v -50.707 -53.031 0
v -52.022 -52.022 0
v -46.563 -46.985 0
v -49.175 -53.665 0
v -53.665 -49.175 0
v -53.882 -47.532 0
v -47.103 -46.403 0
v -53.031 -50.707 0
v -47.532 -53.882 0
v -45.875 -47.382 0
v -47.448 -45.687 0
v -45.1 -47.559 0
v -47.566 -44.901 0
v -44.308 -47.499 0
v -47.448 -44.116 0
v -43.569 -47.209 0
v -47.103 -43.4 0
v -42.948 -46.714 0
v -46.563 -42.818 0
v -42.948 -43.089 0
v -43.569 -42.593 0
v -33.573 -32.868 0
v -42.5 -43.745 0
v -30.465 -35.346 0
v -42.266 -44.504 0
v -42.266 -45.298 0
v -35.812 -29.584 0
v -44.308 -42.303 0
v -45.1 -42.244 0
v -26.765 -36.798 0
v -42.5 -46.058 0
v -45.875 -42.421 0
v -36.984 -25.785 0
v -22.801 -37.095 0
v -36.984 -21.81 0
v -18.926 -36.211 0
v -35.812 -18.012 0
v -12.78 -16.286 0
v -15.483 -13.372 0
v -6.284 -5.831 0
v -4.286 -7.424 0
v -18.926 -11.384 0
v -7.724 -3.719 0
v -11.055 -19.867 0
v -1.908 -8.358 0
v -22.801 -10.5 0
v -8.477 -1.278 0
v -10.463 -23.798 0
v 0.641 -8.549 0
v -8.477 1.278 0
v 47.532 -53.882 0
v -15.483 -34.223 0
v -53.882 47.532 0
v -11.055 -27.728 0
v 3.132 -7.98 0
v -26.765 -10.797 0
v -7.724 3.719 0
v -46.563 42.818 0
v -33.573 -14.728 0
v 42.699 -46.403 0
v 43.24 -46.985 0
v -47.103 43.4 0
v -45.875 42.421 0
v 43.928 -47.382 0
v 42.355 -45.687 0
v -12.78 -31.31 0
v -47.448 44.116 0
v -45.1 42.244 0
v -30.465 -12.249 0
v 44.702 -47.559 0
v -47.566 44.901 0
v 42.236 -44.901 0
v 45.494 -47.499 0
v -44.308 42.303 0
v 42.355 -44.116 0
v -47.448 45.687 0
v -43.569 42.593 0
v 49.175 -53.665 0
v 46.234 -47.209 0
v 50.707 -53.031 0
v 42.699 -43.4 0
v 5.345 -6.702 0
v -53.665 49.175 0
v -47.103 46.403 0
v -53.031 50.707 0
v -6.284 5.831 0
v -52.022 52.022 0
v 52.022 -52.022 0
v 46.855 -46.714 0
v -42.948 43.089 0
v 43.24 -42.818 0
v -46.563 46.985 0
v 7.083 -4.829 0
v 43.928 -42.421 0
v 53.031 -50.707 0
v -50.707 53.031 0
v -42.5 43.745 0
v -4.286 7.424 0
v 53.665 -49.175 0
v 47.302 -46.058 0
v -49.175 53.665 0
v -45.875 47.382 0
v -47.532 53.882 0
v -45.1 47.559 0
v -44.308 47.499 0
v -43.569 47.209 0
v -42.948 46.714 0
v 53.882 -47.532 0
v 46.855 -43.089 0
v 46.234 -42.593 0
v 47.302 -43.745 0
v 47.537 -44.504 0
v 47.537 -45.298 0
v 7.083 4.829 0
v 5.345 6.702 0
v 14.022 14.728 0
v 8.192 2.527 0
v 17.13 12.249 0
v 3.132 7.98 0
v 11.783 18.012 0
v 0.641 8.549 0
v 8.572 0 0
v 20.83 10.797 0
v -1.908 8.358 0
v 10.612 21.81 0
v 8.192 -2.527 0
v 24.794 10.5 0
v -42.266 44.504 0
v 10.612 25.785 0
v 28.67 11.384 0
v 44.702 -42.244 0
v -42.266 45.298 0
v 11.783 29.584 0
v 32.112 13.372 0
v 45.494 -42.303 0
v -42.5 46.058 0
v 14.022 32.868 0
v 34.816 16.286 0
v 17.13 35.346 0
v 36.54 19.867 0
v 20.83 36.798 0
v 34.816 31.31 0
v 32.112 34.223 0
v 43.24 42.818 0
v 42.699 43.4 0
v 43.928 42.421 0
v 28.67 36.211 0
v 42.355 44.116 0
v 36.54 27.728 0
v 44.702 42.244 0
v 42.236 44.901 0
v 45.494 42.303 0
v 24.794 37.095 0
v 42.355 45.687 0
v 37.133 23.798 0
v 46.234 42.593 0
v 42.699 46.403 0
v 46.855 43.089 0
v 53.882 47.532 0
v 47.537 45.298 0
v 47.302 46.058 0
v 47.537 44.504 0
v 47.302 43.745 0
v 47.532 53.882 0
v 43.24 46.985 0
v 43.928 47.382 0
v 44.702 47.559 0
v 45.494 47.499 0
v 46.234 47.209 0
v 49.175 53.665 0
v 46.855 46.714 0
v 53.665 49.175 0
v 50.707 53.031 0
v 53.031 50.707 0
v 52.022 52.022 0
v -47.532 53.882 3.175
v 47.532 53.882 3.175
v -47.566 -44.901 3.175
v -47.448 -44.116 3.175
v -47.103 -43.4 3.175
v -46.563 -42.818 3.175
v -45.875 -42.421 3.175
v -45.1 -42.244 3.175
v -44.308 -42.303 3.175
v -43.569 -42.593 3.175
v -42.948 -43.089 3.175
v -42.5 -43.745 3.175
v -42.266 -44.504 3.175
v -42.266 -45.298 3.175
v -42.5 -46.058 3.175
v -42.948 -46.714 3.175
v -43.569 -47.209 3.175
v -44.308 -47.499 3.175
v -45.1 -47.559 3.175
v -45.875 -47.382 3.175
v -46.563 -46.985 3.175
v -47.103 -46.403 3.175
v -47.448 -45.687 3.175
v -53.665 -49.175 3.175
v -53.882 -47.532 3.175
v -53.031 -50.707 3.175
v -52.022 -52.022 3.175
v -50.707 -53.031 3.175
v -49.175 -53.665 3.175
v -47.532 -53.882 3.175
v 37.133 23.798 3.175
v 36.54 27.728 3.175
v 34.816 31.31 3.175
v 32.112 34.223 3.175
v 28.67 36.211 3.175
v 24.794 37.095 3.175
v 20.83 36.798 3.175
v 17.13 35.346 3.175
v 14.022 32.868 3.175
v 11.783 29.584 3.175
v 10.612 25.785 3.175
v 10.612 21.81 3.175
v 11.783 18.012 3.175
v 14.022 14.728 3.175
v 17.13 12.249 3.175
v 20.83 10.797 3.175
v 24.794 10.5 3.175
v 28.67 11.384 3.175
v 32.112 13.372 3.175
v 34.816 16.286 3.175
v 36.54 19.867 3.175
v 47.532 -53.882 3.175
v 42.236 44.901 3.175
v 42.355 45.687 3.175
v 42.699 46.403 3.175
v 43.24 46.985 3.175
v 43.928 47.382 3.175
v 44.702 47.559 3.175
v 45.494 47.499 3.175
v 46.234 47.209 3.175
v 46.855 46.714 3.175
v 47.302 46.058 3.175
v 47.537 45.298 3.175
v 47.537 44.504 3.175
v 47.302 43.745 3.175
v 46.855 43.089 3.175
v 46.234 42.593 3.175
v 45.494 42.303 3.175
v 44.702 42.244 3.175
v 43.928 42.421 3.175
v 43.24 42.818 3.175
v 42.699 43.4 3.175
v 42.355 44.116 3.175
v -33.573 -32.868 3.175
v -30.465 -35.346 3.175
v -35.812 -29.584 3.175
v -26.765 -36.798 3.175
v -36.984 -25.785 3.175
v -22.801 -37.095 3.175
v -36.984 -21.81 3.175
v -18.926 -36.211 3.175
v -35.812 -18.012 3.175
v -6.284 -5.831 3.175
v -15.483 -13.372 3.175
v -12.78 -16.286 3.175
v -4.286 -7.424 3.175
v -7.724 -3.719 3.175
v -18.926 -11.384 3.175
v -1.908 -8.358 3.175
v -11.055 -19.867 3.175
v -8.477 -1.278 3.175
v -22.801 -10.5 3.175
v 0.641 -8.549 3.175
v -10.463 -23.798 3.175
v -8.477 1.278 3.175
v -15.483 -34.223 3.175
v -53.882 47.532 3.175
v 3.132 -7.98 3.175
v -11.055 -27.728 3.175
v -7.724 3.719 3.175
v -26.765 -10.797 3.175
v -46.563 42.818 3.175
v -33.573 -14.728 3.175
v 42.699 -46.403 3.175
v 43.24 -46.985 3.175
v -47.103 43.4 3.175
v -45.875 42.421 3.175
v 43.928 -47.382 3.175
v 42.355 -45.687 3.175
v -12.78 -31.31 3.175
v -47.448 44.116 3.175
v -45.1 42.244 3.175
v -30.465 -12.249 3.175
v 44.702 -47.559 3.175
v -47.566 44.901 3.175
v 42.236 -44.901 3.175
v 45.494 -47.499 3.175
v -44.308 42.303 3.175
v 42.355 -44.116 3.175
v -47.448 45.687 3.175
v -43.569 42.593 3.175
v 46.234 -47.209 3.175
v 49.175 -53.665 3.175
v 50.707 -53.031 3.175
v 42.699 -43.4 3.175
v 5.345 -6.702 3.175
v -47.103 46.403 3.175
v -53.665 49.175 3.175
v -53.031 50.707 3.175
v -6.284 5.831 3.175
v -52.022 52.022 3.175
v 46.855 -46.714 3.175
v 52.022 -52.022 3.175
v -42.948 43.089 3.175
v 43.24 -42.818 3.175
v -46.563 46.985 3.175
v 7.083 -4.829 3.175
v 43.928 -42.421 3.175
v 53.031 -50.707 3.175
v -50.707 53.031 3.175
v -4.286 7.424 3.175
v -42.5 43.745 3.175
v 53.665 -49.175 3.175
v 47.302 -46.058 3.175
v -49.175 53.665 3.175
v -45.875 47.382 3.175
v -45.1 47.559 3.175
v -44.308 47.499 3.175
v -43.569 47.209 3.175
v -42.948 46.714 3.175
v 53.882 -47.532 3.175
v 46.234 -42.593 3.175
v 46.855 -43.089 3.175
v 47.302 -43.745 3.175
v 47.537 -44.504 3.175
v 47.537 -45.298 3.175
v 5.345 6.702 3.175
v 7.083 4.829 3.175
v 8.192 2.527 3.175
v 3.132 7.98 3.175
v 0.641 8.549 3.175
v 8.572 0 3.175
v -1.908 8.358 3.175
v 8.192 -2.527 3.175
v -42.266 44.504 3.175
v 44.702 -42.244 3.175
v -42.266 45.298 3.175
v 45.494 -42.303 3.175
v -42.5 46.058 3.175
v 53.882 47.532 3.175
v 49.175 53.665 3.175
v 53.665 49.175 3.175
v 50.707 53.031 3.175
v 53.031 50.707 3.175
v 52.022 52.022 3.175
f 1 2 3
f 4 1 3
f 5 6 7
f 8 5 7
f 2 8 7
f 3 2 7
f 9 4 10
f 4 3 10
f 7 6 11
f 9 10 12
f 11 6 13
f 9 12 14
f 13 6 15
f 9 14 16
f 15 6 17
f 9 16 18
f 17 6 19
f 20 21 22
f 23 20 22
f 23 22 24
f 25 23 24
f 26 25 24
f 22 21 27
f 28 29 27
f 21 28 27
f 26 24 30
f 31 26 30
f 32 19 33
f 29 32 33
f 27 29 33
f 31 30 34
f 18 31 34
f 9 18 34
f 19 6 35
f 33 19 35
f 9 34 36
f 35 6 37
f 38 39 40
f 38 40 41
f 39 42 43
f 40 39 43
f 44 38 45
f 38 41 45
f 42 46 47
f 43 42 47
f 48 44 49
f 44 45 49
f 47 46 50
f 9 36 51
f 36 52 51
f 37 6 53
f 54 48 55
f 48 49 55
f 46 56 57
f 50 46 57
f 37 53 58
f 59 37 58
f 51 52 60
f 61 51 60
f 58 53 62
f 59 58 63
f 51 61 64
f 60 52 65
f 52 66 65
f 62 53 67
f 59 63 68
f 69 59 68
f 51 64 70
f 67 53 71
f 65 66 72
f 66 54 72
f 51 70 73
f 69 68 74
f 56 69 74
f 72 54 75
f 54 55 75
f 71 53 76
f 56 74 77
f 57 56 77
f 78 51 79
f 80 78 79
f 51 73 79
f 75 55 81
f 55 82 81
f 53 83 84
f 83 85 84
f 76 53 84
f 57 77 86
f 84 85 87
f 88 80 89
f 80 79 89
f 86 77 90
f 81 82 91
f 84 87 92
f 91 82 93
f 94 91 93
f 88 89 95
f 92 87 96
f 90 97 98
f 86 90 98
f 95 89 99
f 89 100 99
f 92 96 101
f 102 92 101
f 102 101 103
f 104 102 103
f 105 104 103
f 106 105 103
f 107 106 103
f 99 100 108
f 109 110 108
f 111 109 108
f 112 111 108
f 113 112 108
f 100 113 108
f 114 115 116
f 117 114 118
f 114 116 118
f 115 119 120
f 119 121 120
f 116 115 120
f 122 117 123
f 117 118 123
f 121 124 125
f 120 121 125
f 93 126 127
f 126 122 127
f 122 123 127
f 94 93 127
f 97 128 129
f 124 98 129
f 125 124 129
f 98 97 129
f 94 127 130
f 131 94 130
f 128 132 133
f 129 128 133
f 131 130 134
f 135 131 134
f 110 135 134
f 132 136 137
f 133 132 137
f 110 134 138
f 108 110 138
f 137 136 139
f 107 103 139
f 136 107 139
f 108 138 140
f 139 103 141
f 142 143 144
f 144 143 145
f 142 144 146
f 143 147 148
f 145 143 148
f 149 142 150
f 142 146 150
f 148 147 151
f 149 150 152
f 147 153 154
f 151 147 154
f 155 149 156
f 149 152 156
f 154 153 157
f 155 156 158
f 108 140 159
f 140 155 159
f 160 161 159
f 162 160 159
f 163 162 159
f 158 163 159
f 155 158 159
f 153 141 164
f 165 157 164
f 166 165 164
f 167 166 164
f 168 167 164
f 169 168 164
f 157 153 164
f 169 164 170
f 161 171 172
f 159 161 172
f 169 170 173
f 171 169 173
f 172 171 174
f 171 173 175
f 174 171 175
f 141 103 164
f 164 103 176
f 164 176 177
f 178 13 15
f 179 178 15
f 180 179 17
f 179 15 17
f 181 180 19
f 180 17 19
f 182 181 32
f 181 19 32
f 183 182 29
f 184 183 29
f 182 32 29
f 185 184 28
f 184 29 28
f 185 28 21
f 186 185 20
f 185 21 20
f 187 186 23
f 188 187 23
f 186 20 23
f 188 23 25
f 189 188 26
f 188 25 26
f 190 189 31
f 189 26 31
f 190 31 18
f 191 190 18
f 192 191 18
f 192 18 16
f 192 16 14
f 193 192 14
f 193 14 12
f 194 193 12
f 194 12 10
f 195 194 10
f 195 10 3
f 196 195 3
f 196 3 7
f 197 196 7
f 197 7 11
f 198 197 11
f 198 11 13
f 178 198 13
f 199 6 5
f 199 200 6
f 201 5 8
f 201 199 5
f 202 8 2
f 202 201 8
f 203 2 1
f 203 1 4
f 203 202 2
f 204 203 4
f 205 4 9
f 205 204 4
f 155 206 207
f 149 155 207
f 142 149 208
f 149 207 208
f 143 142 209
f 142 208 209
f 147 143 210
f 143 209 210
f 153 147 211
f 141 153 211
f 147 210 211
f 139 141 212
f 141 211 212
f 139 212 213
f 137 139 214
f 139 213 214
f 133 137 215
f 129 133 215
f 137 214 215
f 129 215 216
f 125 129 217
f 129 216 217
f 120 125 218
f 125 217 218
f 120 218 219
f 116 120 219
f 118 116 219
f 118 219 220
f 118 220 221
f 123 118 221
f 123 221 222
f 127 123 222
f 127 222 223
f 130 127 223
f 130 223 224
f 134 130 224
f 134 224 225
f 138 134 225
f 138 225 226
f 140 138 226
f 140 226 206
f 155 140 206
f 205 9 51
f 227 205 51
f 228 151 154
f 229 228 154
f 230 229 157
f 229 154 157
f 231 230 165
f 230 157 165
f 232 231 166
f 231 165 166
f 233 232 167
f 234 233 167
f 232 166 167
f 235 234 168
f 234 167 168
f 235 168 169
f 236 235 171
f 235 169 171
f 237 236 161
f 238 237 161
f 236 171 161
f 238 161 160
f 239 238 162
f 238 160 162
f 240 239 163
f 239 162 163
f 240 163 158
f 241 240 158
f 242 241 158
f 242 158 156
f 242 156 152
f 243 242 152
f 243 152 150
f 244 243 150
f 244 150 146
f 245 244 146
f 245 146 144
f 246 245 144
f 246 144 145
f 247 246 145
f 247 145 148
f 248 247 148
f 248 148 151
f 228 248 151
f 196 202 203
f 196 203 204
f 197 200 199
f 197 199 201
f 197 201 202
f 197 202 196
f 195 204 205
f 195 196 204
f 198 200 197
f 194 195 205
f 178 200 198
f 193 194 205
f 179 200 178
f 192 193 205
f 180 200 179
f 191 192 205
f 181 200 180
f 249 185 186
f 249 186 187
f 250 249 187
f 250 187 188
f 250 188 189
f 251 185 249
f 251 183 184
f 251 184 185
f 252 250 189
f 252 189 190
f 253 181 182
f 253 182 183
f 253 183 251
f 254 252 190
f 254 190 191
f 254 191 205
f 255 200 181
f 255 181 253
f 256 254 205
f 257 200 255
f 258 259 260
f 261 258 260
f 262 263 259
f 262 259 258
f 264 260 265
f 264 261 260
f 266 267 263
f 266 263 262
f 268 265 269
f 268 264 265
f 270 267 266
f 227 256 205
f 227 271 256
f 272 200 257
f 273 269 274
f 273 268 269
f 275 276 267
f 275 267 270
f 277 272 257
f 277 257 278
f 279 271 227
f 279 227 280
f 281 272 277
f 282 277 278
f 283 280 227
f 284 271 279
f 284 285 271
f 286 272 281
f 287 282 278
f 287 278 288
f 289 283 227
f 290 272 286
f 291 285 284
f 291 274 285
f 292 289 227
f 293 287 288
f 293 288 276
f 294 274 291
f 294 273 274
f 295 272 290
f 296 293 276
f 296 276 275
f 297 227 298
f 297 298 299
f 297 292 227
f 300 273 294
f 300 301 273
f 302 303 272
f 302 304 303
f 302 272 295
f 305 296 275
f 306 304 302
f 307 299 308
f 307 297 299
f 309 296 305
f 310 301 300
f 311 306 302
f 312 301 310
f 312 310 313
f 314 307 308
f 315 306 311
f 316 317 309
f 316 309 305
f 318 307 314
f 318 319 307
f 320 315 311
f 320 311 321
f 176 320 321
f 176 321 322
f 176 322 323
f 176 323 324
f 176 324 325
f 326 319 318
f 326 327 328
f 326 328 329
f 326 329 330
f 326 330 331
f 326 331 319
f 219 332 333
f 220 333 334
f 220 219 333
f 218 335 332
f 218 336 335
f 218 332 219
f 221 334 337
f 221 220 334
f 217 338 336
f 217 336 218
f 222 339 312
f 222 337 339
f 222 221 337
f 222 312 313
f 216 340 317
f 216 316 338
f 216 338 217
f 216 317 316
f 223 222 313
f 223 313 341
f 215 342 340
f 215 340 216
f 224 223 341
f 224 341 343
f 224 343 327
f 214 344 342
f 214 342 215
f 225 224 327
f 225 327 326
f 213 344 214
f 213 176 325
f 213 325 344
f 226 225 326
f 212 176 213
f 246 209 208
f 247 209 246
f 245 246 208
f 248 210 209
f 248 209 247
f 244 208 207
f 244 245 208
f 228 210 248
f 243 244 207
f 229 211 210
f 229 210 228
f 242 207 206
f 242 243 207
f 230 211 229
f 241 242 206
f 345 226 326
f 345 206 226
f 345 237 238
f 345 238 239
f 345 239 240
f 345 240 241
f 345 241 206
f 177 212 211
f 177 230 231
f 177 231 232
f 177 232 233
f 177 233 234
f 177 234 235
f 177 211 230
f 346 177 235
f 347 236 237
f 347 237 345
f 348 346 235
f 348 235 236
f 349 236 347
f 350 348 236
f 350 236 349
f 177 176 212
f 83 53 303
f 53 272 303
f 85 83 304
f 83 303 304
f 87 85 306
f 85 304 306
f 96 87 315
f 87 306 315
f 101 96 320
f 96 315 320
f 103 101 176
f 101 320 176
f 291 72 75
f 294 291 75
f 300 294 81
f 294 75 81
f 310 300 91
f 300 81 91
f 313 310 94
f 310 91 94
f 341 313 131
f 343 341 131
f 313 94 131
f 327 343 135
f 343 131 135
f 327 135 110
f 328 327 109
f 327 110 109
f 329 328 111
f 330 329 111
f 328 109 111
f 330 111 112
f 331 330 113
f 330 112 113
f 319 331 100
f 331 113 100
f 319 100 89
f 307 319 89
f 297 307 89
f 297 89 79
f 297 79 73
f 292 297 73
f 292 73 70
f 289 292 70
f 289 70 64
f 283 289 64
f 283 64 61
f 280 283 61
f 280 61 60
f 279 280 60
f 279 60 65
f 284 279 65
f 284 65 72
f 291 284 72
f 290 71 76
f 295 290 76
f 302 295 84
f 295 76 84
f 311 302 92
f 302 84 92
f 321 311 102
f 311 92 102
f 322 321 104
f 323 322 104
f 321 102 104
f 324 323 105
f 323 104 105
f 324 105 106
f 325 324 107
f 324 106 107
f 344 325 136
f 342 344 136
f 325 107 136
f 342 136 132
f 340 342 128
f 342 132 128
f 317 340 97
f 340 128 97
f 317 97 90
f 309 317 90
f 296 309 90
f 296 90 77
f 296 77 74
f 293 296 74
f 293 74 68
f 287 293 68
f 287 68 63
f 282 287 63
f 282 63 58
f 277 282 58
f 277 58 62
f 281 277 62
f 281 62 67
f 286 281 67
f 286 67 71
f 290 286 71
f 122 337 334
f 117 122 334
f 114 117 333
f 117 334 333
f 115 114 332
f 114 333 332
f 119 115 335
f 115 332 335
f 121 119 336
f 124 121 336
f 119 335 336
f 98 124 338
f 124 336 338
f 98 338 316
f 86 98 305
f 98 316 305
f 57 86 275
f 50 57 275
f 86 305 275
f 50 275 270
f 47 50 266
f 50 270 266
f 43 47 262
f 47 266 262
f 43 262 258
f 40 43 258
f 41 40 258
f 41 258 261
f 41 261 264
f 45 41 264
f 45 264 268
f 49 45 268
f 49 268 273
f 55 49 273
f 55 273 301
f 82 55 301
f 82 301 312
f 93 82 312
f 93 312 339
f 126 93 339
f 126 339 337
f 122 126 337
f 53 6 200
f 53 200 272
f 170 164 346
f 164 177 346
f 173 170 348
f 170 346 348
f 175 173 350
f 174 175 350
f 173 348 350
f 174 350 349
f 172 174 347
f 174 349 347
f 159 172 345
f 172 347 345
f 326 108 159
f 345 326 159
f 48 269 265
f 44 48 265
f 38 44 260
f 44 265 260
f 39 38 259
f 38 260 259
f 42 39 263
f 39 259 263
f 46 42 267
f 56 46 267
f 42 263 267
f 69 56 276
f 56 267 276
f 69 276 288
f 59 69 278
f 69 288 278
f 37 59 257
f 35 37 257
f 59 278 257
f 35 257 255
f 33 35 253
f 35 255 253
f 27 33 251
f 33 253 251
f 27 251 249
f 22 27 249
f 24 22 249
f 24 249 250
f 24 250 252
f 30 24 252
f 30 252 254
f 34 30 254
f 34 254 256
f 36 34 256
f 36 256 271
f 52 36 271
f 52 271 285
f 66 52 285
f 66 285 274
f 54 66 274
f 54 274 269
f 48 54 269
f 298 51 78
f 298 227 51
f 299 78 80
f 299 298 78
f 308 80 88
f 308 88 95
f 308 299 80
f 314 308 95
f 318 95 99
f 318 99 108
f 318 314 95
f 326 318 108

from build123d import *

# Parameters (mm, degrees)
SKETCH1_W           = 107.763073452
SKETCH1_H           = 107.763073452
BOSS_EXTRUDE1_DEPTH = 3.175
CUT_EXTRUDE2_REACH  = 78.266
SKETCH4_R           = 8.5725
FILLET2_R           = 6.35
CUT_EXTRUDE3_REACH  = 78.266
SKETCH5_R           = 2.665000004
CUT_EXTRUDE4_REACH  = 78.266
SKETCH6_R           = 13.335


with BuildPart() as part:
    # Sketch1 → Boss-Extrude1 (new body)
    with BuildSketch(Plane.XY):
        Rectangle(SKETCH1_W, SKETCH1_H)
    extrude(amount=BOSS_EXTRUDE1_DEPTH)

    # Sketch4 → Cut-Extrude2 (cut, up to next)
    with BuildSketch(Plane.XY.offset(3.175), mode=Mode.PRIVATE) as cut_extrude2_sk1:
        Circle(SKETCH4_R)
    cut_extrude2_tool1 = extrude(cut_extrude2_sk1.sketch, amount=-CUT_EXTRUDE2_REACH, mode=Mode.PRIVATE) & part.part
    add(cut_extrude2_tool1.solids().sort_by_distance((0, 0, 3.175))[0], mode=Mode.SUBTRACT)

    # Fillet2
    fillet2_edges = [part.edges().sort_by_distance(p)[0] for p in [
        (-53.881536726, -53.881536726, 1.5875),
        (-53.881536726, 53.881536726, 1.5875),
        (53.881536726, 53.881536726, 1.5875),
        (53.881536726, -53.881536726, 1.5875),
    ]]
    fillet(fillet2_edges, radius=FILLET2_R)

    # Sketch5 → Cut-Extrude3 (cut, up to next)
    with BuildSketch(Plane(origin=(0, 0, 0), x_dir=(-1, 0, 0), z_dir=(0, 0, -1)), mode=Mode.PRIVATE) as cut_extrude3_sk1:
        with Locations((44.901280605, 44.901280605)):
            Circle(SKETCH5_R)
    cut_extrude3_tool1 = extrude(cut_extrude3_sk1.sketch, amount=-CUT_EXTRUDE3_REACH, mode=Mode.PRIVATE) & part.part
    # Sketch5 → Cut-Extrude3 (cut, up to next)
    with BuildSketch(Plane(origin=(0, 0, 0), x_dir=(-1, 0, 0), z_dir=(0, 0, -1)), mode=Mode.PRIVATE) as cut_extrude3_sk2:
        with Locations((44.901280605, -44.901280605)):
            Circle(SKETCH5_R)
    cut_extrude3_tool2 = extrude(cut_extrude3_sk2.sketch, amount=-CUT_EXTRUDE3_REACH, mode=Mode.PRIVATE) & part.part
    # Sketch5 → Cut-Extrude3 (cut, up to next)
    with BuildSketch(Plane(origin=(0, 0, 0), x_dir=(-1, 0, 0), z_dir=(0, 0, -1)), mode=Mode.PRIVATE) as cut_extrude3_sk3:
        with Locations((-44.901280605, -44.901280605)):
            Circle(SKETCH5_R)
    cut_extrude3_tool3 = extrude(cut_extrude3_sk3.sketch, amount=-CUT_EXTRUDE3_REACH, mode=Mode.PRIVATE) & part.part
    # Sketch5 → Cut-Extrude3 (cut, up to next)
    with BuildSketch(Plane(origin=(0, 0, 0), x_dir=(-1, 0, 0), z_dir=(0, 0, -1)), mode=Mode.PRIVATE) as cut_extrude3_sk4:
        with Locations((-44.901280605, 44.901280605)):
            Circle(SKETCH5_R)
    cut_extrude3_tool4 = extrude(cut_extrude3_sk4.sketch, amount=-CUT_EXTRUDE3_REACH, mode=Mode.PRIVATE) & part.part
    add(cut_extrude3_tool1.solids().sort_by_distance((-44.901281, 44.901281, 0))[0], mode=Mode.SUBTRACT)
    add(cut_extrude3_tool2.solids().sort_by_distance((-44.901281, -44.901281, 0))[0], mode=Mode.SUBTRACT)
    add(cut_extrude3_tool3.solids().sort_by_distance((44.901281, -44.901281, 0))[0], mode=Mode.SUBTRACT)
    add(cut_extrude3_tool4.solids().sort_by_distance((44.901281, 44.901281, 0))[0], mode=Mode.SUBTRACT)

    # Sketch6 → Cut-Extrude4 (cut, up to next)
    with BuildSketch(Plane.XY.offset(3.175), mode=Mode.PRIVATE) as cut_extrude4_sk1:
        with Locations((23.797678721, 23.797678721)):
            Circle(SKETCH6_R)
    cut_extrude4_tool1 = extrude(cut_extrude4_sk1.sketch, amount=-CUT_EXTRUDE4_REACH, mode=Mode.PRIVATE) & part.part
    # Sketch6 → Cut-Extrude4 (cut, up to next)
    with BuildSketch(Plane.XY.offset(3.175), mode=Mode.PRIVATE) as cut_extrude4_sk2:
        with Locations((-23.797678721, -23.797678721)):
            Circle(SKETCH6_R)
    cut_extrude4_tool2 = extrude(cut_extrude4_sk2.sketch, amount=-CUT_EXTRUDE4_REACH, mode=Mode.PRIVATE) & part.part
    add(cut_extrude4_tool1.solids().sort_by_distance((23.797679, 23.797679, 3.175))[0], mode=Mode.SUBTRACT)
    add(cut_extrude4_tool2.solids().sort_by_distance((-23.797679, -23.797679, 3.175))[0], mode=Mode.SUBTRACT)


solid = part.part
